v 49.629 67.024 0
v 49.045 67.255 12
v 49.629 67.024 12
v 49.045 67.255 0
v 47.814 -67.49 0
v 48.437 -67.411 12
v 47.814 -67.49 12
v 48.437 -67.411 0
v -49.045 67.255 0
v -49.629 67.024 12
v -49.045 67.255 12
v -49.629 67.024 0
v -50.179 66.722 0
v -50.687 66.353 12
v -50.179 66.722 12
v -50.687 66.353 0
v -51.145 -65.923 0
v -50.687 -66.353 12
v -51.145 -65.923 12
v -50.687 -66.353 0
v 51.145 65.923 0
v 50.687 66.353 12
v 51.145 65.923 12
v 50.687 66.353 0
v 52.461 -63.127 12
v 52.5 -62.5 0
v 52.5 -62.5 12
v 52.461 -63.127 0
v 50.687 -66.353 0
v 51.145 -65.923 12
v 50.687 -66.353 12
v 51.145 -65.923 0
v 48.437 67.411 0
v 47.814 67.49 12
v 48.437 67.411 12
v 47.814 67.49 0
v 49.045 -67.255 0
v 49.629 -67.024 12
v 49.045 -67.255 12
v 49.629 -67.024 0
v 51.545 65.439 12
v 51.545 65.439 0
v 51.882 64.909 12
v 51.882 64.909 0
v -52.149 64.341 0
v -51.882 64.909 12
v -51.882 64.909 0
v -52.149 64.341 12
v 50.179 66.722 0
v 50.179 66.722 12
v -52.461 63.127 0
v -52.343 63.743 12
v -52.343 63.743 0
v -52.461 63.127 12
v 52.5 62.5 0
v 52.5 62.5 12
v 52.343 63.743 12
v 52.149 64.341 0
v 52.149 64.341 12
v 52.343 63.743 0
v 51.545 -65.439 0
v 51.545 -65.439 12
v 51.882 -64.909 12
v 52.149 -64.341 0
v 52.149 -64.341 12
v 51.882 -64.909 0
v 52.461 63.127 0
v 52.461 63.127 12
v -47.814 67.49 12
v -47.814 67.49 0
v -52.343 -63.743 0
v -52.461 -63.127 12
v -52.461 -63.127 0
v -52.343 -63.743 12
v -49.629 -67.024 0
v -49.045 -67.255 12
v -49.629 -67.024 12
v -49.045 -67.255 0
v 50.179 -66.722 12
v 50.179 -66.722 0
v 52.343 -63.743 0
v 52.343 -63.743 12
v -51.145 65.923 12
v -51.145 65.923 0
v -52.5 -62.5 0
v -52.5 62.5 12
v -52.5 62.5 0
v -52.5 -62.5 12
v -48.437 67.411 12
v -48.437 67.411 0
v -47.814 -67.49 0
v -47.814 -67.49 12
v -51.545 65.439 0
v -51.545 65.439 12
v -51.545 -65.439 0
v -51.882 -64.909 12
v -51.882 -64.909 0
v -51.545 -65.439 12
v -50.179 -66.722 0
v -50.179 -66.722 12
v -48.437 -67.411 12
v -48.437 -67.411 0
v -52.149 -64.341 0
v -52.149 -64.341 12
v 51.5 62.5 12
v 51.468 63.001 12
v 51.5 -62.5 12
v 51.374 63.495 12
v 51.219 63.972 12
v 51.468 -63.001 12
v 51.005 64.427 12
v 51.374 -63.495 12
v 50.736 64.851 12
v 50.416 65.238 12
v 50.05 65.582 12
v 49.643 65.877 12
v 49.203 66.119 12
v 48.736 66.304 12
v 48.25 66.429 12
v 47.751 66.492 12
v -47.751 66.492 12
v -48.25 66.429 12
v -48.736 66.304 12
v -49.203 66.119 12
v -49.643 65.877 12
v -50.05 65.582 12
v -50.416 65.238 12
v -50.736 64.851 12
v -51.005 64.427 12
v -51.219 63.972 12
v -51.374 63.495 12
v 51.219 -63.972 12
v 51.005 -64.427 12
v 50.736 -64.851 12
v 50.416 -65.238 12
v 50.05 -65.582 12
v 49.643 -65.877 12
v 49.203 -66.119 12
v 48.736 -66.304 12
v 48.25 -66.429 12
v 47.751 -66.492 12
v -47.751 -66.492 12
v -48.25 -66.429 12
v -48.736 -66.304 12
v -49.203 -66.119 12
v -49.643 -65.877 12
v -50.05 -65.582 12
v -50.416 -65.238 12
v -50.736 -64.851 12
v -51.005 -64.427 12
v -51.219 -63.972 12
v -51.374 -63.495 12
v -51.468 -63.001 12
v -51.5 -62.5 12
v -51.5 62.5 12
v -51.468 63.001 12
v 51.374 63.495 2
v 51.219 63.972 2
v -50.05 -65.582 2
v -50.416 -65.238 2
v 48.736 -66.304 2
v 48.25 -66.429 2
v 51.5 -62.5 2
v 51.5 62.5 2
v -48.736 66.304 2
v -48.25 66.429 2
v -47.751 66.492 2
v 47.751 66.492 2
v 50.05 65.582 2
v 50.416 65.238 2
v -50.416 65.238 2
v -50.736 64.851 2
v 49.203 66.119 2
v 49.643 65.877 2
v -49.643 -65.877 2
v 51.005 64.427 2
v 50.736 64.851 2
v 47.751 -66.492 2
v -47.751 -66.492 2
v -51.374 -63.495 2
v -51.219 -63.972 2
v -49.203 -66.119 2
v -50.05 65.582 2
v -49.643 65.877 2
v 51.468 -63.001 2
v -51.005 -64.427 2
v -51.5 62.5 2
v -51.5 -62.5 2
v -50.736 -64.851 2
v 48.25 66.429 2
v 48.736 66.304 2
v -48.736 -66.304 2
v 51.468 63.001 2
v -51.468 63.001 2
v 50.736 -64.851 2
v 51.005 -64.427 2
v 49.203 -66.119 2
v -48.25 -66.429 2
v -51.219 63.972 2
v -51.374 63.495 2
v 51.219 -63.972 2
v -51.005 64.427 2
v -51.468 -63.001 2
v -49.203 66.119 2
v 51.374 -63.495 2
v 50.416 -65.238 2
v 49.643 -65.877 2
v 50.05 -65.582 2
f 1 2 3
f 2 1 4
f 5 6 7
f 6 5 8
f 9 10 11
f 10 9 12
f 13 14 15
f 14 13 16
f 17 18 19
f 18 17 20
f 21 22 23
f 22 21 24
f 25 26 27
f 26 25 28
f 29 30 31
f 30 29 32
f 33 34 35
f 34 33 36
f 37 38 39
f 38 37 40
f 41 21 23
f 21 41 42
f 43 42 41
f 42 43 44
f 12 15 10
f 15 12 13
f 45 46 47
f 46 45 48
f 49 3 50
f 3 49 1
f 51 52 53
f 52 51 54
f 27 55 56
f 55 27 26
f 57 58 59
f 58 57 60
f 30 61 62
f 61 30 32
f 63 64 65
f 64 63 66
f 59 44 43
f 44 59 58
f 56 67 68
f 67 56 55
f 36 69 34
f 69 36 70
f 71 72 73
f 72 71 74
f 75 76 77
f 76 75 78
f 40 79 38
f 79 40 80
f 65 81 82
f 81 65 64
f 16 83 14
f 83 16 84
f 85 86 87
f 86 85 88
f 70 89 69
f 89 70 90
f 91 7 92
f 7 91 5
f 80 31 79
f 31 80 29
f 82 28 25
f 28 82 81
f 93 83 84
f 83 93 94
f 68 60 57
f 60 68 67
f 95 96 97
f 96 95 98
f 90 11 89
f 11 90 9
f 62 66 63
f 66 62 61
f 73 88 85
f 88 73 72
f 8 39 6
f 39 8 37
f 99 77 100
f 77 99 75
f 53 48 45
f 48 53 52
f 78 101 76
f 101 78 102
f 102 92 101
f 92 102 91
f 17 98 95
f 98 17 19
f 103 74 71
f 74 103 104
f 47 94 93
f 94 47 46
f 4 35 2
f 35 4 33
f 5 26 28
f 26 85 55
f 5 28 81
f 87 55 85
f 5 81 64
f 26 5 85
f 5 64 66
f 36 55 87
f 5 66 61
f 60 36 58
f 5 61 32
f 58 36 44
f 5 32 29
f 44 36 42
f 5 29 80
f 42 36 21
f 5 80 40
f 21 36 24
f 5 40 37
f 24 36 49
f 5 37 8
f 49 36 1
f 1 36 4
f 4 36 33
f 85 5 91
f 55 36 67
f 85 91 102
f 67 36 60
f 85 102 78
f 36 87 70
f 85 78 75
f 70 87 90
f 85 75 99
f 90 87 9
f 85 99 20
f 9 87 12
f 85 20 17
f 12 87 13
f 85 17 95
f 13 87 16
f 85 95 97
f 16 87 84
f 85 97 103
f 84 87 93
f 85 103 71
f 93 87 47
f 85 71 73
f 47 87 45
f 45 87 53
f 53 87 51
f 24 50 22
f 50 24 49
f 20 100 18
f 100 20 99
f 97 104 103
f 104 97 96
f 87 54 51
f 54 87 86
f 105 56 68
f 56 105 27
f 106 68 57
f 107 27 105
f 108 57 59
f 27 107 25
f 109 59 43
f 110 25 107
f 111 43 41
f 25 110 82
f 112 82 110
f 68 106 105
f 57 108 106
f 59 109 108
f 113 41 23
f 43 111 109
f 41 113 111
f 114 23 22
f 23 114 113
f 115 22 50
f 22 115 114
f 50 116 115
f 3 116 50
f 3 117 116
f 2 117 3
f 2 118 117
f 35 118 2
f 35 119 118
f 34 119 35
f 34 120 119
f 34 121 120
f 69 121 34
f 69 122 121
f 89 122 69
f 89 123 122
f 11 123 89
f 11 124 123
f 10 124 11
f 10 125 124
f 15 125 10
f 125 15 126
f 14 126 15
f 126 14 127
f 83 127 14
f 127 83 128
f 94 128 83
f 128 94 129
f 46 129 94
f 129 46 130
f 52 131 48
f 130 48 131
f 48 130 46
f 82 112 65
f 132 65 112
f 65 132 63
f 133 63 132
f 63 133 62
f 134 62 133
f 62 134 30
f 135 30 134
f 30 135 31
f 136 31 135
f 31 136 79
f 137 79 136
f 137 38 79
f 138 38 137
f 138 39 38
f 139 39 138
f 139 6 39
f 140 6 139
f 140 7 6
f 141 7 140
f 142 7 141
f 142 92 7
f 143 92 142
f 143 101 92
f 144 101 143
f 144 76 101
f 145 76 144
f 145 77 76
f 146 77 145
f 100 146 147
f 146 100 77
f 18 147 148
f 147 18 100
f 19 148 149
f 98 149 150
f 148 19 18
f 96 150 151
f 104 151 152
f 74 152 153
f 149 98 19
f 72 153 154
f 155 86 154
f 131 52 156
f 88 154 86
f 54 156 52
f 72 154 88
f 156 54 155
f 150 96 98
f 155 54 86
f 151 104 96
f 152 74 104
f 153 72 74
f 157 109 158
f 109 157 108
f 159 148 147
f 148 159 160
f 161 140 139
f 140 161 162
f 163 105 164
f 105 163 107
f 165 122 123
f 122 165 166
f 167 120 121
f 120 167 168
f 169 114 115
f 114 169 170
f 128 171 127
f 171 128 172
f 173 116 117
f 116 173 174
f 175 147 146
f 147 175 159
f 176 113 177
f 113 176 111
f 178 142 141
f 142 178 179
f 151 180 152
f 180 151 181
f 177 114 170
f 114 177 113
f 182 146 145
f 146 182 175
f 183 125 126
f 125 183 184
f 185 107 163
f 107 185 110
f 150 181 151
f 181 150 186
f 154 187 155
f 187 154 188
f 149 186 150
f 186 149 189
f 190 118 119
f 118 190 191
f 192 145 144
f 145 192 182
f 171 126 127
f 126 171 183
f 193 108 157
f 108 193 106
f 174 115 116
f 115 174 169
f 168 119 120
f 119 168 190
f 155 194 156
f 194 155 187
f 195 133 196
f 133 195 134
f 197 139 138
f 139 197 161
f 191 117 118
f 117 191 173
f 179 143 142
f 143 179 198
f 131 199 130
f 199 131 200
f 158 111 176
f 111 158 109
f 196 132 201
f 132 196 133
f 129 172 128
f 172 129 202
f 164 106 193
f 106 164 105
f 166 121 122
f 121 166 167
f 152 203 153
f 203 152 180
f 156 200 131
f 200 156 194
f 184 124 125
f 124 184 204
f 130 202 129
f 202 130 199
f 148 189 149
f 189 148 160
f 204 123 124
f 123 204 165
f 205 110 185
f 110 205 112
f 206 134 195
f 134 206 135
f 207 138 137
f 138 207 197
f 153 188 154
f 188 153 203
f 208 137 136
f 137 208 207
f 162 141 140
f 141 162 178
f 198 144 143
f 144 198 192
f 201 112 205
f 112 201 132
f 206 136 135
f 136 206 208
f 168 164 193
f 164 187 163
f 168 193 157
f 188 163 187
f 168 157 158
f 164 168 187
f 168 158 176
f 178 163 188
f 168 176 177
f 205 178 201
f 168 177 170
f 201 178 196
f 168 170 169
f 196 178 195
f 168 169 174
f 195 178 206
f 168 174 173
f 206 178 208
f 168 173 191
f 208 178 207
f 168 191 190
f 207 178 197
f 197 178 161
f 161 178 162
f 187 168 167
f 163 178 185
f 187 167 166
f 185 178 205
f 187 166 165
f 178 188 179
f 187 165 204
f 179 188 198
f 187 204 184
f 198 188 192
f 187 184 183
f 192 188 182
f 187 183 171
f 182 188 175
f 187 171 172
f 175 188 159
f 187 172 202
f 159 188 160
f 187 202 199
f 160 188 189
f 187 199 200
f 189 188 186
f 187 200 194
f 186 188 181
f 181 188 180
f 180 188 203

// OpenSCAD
$fn = 50;


difference() {
	union() {
		hull() {
			translate(v = [-47.5000000000, 62.5000000000, 0]) {
				cylinder(h = 12, r = 5);
			}
			translate(v = [47.5000000000, 62.5000000000, 0]) {
				cylinder(h = 12, r = 5);
			}
			translate(v = [-47.5000000000, -62.5000000000, 0]) {
				cylinder(h = 12, r = 5);
			}
			translate(v = [47.5000000000, -62.5000000000, 0]) {
				cylinder(h = 12, r = 5);
			}
		}
	}
	union() {
		translate(v = [0, 0, 2]) {
			hull() {
				translate(v = [-47.5000000000, 62.5000000000, 0]) {
					cylinder(h = 10, r = 4);
				}
				translate(v = [47.5000000000, 62.5000000000, 0]) {
					cylinder(h = 10, r = 4);
				}
				translate(v = [-47.5000000000, -62.5000000000, 0]) {
					cylinder(h = 10, r = 4);
				}
				translate(v = [47.5000000000, -62.5000000000, 0]) {
					cylinder(h = 10, r = 4);
				}
			}
		}
	}
}
